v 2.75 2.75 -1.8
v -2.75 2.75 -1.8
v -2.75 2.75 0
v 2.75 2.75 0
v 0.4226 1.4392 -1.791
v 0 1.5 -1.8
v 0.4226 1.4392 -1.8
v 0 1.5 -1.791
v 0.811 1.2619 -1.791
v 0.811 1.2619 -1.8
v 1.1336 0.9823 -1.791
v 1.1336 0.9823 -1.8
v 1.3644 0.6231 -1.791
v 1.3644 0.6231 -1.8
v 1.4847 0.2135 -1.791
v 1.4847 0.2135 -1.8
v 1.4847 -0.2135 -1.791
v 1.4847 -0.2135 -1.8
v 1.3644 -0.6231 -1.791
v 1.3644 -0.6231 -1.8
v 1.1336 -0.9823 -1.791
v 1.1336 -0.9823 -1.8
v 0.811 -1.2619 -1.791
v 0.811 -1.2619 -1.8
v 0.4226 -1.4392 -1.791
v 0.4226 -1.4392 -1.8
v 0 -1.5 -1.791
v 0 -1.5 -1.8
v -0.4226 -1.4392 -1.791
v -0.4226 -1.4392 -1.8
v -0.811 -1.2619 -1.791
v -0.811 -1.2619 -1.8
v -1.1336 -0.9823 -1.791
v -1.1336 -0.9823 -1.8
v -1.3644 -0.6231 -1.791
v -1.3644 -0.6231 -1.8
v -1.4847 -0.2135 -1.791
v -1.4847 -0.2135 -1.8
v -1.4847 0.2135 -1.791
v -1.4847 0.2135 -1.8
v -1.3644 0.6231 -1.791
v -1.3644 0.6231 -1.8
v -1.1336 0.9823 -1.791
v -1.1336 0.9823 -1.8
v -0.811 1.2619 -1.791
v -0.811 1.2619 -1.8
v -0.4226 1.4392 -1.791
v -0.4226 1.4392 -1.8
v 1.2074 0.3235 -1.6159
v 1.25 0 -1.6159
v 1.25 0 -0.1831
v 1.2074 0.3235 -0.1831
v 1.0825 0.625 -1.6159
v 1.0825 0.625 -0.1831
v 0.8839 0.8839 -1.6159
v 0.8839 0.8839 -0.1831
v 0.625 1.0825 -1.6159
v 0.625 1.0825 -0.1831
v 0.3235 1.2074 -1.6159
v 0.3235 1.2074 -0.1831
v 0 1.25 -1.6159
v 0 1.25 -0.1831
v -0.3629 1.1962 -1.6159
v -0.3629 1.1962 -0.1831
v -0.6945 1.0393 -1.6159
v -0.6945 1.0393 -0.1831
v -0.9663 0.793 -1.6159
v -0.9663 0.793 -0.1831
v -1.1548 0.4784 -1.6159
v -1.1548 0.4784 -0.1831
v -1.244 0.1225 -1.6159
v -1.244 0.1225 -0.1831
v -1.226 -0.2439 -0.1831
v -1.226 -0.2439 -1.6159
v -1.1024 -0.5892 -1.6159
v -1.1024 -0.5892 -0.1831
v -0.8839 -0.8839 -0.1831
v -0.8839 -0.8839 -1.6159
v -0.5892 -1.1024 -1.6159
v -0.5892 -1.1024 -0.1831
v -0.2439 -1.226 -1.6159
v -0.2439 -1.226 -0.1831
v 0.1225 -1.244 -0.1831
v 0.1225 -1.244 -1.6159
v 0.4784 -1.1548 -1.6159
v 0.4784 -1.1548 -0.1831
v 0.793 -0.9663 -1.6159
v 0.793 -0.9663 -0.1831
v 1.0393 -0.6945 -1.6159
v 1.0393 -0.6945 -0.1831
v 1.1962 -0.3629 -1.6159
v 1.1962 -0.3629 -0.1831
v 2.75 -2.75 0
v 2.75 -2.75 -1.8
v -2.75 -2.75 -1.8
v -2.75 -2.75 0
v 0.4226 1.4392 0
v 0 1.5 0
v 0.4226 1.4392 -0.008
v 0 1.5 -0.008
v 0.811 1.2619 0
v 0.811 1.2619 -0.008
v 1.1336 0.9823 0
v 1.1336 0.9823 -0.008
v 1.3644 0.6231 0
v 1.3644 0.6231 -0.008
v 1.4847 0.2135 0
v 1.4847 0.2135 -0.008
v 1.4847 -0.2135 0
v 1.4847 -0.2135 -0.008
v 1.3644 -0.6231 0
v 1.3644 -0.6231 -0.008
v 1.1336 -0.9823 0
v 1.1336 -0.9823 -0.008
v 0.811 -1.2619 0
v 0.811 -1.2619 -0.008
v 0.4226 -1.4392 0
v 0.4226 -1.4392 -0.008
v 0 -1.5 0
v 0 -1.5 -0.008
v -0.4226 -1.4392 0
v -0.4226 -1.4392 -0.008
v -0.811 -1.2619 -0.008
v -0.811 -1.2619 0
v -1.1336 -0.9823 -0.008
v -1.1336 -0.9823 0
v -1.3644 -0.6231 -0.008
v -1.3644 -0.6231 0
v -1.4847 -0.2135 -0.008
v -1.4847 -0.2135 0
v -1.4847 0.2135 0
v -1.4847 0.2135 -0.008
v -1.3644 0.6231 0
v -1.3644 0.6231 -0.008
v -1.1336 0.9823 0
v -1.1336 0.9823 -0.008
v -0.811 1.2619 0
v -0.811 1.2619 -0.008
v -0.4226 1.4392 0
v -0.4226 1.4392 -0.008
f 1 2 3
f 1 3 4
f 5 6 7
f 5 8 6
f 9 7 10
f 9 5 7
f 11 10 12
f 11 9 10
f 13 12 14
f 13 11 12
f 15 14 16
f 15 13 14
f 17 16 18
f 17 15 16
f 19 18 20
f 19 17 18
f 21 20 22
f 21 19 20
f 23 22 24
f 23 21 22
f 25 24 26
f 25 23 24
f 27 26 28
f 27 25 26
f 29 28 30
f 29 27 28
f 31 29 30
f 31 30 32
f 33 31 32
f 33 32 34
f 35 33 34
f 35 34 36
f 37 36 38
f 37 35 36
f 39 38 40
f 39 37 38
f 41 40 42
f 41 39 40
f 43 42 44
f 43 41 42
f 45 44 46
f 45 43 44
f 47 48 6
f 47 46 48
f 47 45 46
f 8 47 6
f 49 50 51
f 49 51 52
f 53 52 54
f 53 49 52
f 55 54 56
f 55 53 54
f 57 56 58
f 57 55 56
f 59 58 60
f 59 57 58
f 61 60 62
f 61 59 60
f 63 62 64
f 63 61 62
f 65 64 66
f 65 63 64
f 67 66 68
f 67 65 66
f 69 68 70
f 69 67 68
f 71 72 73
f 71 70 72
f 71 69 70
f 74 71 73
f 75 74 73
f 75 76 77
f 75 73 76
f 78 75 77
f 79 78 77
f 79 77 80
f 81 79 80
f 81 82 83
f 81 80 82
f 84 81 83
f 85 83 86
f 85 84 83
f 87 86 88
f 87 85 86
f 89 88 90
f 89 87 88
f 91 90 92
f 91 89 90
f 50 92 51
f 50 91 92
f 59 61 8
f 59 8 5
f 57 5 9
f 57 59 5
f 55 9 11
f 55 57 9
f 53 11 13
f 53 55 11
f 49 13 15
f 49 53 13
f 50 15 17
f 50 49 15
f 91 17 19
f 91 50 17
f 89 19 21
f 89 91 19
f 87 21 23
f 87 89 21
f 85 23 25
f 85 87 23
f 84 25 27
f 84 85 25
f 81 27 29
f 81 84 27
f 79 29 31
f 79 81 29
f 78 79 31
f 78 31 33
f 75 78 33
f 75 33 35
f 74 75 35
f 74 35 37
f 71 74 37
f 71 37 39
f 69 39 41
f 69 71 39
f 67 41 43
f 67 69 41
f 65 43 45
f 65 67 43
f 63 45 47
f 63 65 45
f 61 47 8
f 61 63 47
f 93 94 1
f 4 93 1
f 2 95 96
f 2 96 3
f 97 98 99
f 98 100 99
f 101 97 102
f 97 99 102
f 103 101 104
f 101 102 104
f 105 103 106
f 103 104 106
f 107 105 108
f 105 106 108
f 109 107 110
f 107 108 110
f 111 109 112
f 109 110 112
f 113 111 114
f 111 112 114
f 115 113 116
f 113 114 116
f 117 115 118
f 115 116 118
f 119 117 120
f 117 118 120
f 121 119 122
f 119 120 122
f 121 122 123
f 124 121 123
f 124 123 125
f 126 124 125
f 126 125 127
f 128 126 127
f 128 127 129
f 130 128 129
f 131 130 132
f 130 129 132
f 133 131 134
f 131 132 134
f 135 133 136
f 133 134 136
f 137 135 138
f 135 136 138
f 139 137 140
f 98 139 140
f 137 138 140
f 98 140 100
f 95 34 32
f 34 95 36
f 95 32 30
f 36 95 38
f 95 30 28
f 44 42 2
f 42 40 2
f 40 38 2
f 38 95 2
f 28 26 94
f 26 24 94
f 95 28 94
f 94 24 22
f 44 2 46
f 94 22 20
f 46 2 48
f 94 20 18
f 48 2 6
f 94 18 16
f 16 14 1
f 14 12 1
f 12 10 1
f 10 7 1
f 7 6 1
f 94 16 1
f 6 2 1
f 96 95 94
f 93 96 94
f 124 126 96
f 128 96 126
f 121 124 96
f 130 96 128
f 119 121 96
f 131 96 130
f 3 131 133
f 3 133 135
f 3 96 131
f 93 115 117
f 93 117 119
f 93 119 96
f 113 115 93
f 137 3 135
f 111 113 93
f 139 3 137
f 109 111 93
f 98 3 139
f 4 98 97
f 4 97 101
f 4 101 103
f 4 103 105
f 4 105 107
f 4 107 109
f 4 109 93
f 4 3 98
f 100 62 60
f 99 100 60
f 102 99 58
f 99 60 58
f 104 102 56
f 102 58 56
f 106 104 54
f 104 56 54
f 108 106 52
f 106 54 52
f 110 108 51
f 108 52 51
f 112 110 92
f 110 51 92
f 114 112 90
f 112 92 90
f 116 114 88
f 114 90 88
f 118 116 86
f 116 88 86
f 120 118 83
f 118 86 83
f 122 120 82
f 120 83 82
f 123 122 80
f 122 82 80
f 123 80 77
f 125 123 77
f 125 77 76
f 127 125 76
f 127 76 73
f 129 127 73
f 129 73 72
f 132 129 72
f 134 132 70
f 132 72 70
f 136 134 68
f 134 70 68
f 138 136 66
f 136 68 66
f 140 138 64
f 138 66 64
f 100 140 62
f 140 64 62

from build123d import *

# Parameters (mm, degrees)
BASENUT_START = -1.8
BASENUTSKE_W  = 5.5
BASENUTSKE_H  = 5.5
BASENUTSKE_R  = 1.25
BASENUT_DEPTH = 1.8


with BuildPart() as part:
    # BaseNutSke → BaseNut (new body)
    with BuildSketch(Plane.XY.offset(BASENUT_START)):
        Rectangle(BASENUTSKE_W, BASENUTSKE_H)
        Circle(BASENUTSKE_R, mode=Mode.SUBTRACT)
    extrude(amount=BASENUT_DEPTH)

    # EndChamferSketch → EndChamfer (revolve, cut)
    with BuildSketch(Plane(origin=(0, 0, 0), x_dir=(0, 0, -1), z_dir=(1, 0, 0))):
        Polygon((1.791, 1.5), (1.598442927, 1.225), (1.801, 1.225), (1.801, 1.5), align=None)
        Polygon((-0.002, 1.5), (0.008, 1.5), (0.200557073, 1.225), (-0.002, 1.225), align=None)
    revolve(axis=Axis((0, 0, -25.037505729), (0, 0, -1)), mode=Mode.SUBTRACT)


solid = part.part
